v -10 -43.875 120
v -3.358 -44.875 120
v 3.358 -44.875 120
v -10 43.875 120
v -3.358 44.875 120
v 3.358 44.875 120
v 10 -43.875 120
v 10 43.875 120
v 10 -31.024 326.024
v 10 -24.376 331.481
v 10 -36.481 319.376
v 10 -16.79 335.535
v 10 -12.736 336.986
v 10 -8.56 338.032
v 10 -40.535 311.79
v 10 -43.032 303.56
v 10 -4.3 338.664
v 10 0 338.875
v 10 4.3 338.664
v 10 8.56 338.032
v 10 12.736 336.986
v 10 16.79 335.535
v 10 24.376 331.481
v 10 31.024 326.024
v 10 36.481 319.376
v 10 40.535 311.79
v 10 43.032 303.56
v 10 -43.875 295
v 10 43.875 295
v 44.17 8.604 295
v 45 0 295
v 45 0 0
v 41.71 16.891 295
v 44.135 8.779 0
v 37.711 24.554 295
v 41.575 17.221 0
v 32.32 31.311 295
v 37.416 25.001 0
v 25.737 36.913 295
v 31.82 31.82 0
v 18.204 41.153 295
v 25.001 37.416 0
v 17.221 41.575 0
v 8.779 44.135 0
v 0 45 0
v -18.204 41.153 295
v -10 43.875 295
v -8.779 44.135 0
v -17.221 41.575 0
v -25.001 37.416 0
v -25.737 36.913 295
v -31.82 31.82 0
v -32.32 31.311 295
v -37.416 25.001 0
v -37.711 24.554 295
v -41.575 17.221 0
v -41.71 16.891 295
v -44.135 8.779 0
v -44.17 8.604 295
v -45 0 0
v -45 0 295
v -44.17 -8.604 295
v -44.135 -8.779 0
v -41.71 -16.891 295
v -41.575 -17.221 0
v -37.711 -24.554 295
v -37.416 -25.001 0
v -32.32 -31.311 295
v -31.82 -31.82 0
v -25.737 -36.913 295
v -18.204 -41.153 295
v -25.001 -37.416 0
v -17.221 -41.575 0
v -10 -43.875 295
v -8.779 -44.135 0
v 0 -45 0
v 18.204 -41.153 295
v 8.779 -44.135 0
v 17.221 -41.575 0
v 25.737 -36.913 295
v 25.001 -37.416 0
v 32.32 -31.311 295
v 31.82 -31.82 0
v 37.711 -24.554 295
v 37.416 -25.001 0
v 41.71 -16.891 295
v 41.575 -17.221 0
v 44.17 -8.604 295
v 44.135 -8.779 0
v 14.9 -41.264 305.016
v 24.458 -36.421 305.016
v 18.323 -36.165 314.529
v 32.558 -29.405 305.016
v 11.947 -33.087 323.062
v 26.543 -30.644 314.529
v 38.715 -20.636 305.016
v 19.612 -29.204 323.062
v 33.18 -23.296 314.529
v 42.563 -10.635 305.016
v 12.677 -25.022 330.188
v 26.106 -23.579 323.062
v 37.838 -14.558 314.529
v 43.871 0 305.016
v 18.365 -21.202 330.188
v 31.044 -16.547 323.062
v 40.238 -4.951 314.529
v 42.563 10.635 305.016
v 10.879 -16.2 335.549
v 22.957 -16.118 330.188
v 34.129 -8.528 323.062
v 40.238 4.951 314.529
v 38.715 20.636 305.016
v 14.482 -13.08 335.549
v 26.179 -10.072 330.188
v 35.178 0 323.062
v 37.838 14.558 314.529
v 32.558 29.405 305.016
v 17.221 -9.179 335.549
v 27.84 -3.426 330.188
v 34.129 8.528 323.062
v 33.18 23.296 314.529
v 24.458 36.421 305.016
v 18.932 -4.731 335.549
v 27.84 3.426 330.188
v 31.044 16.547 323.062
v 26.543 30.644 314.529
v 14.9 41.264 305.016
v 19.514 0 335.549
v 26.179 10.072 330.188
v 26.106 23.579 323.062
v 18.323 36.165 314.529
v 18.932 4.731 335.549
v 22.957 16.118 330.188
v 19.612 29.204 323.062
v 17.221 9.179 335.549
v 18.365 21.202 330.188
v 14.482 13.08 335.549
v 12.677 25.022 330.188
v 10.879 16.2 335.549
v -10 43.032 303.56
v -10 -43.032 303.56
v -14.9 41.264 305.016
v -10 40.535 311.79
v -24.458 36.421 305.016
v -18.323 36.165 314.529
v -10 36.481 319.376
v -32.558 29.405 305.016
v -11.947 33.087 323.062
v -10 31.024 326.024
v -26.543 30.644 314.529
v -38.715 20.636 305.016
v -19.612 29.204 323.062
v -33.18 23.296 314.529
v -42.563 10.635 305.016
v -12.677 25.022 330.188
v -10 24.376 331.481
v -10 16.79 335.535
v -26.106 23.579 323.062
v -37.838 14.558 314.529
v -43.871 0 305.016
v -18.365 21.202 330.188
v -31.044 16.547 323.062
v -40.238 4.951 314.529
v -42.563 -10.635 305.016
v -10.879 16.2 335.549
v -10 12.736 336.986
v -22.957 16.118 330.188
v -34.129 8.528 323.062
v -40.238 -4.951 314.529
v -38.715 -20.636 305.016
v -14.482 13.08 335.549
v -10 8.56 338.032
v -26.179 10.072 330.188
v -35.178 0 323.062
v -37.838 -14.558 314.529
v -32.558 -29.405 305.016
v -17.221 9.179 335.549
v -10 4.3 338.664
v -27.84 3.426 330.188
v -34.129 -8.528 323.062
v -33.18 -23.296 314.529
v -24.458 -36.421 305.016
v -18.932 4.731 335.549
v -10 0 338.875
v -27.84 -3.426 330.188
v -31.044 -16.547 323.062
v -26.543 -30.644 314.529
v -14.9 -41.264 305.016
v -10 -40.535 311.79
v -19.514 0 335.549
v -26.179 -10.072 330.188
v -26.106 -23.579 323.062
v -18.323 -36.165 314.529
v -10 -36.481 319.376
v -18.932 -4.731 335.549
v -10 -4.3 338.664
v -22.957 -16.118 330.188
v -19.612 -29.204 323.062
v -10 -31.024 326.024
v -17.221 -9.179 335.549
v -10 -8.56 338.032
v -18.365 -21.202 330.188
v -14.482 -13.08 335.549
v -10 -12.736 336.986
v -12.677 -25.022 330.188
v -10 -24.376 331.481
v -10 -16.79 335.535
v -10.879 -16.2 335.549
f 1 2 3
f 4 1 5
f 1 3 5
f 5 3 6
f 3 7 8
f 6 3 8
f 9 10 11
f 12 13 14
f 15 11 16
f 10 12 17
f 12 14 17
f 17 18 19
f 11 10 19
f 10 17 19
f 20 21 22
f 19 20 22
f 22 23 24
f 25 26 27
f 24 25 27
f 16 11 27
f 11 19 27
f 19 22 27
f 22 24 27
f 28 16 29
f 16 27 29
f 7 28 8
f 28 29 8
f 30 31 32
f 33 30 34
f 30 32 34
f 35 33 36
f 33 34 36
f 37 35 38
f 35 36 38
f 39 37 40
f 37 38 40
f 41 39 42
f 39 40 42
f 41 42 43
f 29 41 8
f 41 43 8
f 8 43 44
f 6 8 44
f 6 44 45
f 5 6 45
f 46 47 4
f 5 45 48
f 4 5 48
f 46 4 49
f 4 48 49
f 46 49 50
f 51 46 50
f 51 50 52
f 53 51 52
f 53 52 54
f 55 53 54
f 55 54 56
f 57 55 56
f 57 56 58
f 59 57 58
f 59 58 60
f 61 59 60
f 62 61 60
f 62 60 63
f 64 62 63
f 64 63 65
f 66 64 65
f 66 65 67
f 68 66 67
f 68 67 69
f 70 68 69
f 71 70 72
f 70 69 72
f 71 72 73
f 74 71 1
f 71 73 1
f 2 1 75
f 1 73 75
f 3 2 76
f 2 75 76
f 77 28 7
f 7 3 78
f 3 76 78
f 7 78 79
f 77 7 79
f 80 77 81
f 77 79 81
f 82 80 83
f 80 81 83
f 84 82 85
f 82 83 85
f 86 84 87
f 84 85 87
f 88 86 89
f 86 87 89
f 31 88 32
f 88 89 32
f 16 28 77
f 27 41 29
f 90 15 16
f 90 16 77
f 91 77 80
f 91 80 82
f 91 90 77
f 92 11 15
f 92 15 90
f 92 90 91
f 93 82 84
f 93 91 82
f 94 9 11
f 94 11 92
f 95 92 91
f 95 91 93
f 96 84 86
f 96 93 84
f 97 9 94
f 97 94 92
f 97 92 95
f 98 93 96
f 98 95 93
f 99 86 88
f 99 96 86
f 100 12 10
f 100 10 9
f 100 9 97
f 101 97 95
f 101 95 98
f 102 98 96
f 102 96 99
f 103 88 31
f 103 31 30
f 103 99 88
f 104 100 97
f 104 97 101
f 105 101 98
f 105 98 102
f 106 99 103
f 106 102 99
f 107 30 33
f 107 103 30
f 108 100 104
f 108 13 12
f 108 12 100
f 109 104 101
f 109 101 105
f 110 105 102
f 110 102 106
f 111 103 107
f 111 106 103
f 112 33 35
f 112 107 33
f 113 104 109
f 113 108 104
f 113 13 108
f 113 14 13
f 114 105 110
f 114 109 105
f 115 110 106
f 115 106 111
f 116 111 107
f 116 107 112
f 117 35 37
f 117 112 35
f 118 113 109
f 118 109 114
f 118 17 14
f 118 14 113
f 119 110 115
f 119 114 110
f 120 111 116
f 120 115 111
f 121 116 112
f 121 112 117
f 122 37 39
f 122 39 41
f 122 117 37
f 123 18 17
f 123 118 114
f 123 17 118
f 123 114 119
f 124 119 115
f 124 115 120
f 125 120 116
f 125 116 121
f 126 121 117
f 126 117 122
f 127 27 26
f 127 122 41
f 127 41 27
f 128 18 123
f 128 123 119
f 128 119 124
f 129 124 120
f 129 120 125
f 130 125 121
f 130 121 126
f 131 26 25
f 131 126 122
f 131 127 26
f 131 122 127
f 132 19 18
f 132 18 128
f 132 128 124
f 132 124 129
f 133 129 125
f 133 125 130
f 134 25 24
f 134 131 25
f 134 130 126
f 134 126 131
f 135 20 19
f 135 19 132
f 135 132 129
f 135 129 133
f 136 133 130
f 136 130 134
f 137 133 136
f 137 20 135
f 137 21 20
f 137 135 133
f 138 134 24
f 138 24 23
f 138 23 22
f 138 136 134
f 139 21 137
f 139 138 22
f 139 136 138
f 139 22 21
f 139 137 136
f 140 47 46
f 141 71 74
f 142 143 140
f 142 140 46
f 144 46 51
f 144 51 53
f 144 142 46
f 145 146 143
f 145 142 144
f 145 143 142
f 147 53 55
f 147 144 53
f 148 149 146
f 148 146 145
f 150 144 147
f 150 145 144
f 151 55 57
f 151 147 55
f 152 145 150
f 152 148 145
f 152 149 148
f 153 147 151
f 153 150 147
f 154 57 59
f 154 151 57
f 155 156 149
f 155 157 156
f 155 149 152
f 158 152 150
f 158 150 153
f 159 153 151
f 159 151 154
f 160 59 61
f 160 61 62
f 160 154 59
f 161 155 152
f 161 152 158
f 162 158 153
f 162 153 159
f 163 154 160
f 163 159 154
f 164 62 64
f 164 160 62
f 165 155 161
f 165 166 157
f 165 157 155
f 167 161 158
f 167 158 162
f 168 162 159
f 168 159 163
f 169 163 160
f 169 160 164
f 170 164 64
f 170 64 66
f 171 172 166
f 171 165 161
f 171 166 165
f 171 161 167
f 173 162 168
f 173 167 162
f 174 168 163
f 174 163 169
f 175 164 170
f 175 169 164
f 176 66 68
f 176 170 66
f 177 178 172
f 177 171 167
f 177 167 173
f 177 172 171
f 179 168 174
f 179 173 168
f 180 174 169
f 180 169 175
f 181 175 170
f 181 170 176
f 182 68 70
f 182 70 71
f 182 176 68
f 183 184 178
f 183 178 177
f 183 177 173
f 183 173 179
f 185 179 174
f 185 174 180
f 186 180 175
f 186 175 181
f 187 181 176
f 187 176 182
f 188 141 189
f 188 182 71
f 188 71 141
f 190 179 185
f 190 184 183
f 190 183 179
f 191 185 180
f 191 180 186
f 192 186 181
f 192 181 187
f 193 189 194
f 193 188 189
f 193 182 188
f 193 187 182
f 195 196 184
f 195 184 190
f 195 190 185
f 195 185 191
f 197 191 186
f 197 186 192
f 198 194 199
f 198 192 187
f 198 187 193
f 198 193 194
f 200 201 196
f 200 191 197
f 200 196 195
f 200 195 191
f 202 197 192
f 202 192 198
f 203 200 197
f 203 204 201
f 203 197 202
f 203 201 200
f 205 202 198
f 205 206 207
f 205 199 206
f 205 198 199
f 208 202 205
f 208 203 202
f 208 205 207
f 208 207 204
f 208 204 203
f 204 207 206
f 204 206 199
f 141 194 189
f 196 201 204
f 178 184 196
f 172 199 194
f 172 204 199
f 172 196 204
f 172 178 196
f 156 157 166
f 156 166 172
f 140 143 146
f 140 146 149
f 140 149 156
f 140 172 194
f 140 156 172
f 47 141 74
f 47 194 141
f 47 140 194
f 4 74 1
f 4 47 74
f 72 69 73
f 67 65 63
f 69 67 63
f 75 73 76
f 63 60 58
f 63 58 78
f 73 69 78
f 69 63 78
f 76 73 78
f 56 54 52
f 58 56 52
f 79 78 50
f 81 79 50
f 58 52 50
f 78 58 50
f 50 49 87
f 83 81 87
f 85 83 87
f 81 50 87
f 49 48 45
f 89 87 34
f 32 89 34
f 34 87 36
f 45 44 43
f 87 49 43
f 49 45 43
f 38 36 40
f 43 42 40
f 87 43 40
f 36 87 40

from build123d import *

# Parameters (mm, degrees)
SKETCH1_R           = 45
BOSS_EXTRUDE1_DEPTH = 340
FILLET1_R           = 45
SKETCH2_OUTSIDE_W   = 414.608
SKETCH2_OUTSIDE_H   = 164.608
SKETCH2_OUTSIDE_W_2 = 150
SKETCH2_OUTSIDE_H_2 = 90
CUT_EXTRUDE1_DEPTH  = 10


with BuildPart() as part:
    # Sketch1 → Boss-Extrude1 (new body)
    with BuildSketch(Plane.XY):
        Circle(SKETCH1_R)
    extrude(amount=BOSS_EXTRUDE1_DEPTH)

    # Fillet1
    fillet1_edges = [part.edges().sort_by_distance(p)[0] for p in [
        (-45, 0, 340),
    ]]
    fillet(fillet1_edges, radius=FILLET1_R)

    # Sketch2 outside → Cut-Extrude1 (cut, symmetric)
    with BuildSketch(Plane(origin=(0, 0, 0), x_dir=(0, 0, -1), z_dir=(1, 0, 0))):
        with Locations((-170, 0)):
            Rectangle(SKETCH2_OUTSIDE_W, SKETCH2_OUTSIDE_H)
        with Locations((-45, 0)):
            Rectangle(SKETCH2_OUTSIDE_W_2, SKETCH2_OUTSIDE_H_2, mode=Mode.SUBTRACT)
    extrude(amount=CUT_EXTRUDE1_DEPTH, both=True, mode=Mode.SUBTRACT)


solid = part.part
